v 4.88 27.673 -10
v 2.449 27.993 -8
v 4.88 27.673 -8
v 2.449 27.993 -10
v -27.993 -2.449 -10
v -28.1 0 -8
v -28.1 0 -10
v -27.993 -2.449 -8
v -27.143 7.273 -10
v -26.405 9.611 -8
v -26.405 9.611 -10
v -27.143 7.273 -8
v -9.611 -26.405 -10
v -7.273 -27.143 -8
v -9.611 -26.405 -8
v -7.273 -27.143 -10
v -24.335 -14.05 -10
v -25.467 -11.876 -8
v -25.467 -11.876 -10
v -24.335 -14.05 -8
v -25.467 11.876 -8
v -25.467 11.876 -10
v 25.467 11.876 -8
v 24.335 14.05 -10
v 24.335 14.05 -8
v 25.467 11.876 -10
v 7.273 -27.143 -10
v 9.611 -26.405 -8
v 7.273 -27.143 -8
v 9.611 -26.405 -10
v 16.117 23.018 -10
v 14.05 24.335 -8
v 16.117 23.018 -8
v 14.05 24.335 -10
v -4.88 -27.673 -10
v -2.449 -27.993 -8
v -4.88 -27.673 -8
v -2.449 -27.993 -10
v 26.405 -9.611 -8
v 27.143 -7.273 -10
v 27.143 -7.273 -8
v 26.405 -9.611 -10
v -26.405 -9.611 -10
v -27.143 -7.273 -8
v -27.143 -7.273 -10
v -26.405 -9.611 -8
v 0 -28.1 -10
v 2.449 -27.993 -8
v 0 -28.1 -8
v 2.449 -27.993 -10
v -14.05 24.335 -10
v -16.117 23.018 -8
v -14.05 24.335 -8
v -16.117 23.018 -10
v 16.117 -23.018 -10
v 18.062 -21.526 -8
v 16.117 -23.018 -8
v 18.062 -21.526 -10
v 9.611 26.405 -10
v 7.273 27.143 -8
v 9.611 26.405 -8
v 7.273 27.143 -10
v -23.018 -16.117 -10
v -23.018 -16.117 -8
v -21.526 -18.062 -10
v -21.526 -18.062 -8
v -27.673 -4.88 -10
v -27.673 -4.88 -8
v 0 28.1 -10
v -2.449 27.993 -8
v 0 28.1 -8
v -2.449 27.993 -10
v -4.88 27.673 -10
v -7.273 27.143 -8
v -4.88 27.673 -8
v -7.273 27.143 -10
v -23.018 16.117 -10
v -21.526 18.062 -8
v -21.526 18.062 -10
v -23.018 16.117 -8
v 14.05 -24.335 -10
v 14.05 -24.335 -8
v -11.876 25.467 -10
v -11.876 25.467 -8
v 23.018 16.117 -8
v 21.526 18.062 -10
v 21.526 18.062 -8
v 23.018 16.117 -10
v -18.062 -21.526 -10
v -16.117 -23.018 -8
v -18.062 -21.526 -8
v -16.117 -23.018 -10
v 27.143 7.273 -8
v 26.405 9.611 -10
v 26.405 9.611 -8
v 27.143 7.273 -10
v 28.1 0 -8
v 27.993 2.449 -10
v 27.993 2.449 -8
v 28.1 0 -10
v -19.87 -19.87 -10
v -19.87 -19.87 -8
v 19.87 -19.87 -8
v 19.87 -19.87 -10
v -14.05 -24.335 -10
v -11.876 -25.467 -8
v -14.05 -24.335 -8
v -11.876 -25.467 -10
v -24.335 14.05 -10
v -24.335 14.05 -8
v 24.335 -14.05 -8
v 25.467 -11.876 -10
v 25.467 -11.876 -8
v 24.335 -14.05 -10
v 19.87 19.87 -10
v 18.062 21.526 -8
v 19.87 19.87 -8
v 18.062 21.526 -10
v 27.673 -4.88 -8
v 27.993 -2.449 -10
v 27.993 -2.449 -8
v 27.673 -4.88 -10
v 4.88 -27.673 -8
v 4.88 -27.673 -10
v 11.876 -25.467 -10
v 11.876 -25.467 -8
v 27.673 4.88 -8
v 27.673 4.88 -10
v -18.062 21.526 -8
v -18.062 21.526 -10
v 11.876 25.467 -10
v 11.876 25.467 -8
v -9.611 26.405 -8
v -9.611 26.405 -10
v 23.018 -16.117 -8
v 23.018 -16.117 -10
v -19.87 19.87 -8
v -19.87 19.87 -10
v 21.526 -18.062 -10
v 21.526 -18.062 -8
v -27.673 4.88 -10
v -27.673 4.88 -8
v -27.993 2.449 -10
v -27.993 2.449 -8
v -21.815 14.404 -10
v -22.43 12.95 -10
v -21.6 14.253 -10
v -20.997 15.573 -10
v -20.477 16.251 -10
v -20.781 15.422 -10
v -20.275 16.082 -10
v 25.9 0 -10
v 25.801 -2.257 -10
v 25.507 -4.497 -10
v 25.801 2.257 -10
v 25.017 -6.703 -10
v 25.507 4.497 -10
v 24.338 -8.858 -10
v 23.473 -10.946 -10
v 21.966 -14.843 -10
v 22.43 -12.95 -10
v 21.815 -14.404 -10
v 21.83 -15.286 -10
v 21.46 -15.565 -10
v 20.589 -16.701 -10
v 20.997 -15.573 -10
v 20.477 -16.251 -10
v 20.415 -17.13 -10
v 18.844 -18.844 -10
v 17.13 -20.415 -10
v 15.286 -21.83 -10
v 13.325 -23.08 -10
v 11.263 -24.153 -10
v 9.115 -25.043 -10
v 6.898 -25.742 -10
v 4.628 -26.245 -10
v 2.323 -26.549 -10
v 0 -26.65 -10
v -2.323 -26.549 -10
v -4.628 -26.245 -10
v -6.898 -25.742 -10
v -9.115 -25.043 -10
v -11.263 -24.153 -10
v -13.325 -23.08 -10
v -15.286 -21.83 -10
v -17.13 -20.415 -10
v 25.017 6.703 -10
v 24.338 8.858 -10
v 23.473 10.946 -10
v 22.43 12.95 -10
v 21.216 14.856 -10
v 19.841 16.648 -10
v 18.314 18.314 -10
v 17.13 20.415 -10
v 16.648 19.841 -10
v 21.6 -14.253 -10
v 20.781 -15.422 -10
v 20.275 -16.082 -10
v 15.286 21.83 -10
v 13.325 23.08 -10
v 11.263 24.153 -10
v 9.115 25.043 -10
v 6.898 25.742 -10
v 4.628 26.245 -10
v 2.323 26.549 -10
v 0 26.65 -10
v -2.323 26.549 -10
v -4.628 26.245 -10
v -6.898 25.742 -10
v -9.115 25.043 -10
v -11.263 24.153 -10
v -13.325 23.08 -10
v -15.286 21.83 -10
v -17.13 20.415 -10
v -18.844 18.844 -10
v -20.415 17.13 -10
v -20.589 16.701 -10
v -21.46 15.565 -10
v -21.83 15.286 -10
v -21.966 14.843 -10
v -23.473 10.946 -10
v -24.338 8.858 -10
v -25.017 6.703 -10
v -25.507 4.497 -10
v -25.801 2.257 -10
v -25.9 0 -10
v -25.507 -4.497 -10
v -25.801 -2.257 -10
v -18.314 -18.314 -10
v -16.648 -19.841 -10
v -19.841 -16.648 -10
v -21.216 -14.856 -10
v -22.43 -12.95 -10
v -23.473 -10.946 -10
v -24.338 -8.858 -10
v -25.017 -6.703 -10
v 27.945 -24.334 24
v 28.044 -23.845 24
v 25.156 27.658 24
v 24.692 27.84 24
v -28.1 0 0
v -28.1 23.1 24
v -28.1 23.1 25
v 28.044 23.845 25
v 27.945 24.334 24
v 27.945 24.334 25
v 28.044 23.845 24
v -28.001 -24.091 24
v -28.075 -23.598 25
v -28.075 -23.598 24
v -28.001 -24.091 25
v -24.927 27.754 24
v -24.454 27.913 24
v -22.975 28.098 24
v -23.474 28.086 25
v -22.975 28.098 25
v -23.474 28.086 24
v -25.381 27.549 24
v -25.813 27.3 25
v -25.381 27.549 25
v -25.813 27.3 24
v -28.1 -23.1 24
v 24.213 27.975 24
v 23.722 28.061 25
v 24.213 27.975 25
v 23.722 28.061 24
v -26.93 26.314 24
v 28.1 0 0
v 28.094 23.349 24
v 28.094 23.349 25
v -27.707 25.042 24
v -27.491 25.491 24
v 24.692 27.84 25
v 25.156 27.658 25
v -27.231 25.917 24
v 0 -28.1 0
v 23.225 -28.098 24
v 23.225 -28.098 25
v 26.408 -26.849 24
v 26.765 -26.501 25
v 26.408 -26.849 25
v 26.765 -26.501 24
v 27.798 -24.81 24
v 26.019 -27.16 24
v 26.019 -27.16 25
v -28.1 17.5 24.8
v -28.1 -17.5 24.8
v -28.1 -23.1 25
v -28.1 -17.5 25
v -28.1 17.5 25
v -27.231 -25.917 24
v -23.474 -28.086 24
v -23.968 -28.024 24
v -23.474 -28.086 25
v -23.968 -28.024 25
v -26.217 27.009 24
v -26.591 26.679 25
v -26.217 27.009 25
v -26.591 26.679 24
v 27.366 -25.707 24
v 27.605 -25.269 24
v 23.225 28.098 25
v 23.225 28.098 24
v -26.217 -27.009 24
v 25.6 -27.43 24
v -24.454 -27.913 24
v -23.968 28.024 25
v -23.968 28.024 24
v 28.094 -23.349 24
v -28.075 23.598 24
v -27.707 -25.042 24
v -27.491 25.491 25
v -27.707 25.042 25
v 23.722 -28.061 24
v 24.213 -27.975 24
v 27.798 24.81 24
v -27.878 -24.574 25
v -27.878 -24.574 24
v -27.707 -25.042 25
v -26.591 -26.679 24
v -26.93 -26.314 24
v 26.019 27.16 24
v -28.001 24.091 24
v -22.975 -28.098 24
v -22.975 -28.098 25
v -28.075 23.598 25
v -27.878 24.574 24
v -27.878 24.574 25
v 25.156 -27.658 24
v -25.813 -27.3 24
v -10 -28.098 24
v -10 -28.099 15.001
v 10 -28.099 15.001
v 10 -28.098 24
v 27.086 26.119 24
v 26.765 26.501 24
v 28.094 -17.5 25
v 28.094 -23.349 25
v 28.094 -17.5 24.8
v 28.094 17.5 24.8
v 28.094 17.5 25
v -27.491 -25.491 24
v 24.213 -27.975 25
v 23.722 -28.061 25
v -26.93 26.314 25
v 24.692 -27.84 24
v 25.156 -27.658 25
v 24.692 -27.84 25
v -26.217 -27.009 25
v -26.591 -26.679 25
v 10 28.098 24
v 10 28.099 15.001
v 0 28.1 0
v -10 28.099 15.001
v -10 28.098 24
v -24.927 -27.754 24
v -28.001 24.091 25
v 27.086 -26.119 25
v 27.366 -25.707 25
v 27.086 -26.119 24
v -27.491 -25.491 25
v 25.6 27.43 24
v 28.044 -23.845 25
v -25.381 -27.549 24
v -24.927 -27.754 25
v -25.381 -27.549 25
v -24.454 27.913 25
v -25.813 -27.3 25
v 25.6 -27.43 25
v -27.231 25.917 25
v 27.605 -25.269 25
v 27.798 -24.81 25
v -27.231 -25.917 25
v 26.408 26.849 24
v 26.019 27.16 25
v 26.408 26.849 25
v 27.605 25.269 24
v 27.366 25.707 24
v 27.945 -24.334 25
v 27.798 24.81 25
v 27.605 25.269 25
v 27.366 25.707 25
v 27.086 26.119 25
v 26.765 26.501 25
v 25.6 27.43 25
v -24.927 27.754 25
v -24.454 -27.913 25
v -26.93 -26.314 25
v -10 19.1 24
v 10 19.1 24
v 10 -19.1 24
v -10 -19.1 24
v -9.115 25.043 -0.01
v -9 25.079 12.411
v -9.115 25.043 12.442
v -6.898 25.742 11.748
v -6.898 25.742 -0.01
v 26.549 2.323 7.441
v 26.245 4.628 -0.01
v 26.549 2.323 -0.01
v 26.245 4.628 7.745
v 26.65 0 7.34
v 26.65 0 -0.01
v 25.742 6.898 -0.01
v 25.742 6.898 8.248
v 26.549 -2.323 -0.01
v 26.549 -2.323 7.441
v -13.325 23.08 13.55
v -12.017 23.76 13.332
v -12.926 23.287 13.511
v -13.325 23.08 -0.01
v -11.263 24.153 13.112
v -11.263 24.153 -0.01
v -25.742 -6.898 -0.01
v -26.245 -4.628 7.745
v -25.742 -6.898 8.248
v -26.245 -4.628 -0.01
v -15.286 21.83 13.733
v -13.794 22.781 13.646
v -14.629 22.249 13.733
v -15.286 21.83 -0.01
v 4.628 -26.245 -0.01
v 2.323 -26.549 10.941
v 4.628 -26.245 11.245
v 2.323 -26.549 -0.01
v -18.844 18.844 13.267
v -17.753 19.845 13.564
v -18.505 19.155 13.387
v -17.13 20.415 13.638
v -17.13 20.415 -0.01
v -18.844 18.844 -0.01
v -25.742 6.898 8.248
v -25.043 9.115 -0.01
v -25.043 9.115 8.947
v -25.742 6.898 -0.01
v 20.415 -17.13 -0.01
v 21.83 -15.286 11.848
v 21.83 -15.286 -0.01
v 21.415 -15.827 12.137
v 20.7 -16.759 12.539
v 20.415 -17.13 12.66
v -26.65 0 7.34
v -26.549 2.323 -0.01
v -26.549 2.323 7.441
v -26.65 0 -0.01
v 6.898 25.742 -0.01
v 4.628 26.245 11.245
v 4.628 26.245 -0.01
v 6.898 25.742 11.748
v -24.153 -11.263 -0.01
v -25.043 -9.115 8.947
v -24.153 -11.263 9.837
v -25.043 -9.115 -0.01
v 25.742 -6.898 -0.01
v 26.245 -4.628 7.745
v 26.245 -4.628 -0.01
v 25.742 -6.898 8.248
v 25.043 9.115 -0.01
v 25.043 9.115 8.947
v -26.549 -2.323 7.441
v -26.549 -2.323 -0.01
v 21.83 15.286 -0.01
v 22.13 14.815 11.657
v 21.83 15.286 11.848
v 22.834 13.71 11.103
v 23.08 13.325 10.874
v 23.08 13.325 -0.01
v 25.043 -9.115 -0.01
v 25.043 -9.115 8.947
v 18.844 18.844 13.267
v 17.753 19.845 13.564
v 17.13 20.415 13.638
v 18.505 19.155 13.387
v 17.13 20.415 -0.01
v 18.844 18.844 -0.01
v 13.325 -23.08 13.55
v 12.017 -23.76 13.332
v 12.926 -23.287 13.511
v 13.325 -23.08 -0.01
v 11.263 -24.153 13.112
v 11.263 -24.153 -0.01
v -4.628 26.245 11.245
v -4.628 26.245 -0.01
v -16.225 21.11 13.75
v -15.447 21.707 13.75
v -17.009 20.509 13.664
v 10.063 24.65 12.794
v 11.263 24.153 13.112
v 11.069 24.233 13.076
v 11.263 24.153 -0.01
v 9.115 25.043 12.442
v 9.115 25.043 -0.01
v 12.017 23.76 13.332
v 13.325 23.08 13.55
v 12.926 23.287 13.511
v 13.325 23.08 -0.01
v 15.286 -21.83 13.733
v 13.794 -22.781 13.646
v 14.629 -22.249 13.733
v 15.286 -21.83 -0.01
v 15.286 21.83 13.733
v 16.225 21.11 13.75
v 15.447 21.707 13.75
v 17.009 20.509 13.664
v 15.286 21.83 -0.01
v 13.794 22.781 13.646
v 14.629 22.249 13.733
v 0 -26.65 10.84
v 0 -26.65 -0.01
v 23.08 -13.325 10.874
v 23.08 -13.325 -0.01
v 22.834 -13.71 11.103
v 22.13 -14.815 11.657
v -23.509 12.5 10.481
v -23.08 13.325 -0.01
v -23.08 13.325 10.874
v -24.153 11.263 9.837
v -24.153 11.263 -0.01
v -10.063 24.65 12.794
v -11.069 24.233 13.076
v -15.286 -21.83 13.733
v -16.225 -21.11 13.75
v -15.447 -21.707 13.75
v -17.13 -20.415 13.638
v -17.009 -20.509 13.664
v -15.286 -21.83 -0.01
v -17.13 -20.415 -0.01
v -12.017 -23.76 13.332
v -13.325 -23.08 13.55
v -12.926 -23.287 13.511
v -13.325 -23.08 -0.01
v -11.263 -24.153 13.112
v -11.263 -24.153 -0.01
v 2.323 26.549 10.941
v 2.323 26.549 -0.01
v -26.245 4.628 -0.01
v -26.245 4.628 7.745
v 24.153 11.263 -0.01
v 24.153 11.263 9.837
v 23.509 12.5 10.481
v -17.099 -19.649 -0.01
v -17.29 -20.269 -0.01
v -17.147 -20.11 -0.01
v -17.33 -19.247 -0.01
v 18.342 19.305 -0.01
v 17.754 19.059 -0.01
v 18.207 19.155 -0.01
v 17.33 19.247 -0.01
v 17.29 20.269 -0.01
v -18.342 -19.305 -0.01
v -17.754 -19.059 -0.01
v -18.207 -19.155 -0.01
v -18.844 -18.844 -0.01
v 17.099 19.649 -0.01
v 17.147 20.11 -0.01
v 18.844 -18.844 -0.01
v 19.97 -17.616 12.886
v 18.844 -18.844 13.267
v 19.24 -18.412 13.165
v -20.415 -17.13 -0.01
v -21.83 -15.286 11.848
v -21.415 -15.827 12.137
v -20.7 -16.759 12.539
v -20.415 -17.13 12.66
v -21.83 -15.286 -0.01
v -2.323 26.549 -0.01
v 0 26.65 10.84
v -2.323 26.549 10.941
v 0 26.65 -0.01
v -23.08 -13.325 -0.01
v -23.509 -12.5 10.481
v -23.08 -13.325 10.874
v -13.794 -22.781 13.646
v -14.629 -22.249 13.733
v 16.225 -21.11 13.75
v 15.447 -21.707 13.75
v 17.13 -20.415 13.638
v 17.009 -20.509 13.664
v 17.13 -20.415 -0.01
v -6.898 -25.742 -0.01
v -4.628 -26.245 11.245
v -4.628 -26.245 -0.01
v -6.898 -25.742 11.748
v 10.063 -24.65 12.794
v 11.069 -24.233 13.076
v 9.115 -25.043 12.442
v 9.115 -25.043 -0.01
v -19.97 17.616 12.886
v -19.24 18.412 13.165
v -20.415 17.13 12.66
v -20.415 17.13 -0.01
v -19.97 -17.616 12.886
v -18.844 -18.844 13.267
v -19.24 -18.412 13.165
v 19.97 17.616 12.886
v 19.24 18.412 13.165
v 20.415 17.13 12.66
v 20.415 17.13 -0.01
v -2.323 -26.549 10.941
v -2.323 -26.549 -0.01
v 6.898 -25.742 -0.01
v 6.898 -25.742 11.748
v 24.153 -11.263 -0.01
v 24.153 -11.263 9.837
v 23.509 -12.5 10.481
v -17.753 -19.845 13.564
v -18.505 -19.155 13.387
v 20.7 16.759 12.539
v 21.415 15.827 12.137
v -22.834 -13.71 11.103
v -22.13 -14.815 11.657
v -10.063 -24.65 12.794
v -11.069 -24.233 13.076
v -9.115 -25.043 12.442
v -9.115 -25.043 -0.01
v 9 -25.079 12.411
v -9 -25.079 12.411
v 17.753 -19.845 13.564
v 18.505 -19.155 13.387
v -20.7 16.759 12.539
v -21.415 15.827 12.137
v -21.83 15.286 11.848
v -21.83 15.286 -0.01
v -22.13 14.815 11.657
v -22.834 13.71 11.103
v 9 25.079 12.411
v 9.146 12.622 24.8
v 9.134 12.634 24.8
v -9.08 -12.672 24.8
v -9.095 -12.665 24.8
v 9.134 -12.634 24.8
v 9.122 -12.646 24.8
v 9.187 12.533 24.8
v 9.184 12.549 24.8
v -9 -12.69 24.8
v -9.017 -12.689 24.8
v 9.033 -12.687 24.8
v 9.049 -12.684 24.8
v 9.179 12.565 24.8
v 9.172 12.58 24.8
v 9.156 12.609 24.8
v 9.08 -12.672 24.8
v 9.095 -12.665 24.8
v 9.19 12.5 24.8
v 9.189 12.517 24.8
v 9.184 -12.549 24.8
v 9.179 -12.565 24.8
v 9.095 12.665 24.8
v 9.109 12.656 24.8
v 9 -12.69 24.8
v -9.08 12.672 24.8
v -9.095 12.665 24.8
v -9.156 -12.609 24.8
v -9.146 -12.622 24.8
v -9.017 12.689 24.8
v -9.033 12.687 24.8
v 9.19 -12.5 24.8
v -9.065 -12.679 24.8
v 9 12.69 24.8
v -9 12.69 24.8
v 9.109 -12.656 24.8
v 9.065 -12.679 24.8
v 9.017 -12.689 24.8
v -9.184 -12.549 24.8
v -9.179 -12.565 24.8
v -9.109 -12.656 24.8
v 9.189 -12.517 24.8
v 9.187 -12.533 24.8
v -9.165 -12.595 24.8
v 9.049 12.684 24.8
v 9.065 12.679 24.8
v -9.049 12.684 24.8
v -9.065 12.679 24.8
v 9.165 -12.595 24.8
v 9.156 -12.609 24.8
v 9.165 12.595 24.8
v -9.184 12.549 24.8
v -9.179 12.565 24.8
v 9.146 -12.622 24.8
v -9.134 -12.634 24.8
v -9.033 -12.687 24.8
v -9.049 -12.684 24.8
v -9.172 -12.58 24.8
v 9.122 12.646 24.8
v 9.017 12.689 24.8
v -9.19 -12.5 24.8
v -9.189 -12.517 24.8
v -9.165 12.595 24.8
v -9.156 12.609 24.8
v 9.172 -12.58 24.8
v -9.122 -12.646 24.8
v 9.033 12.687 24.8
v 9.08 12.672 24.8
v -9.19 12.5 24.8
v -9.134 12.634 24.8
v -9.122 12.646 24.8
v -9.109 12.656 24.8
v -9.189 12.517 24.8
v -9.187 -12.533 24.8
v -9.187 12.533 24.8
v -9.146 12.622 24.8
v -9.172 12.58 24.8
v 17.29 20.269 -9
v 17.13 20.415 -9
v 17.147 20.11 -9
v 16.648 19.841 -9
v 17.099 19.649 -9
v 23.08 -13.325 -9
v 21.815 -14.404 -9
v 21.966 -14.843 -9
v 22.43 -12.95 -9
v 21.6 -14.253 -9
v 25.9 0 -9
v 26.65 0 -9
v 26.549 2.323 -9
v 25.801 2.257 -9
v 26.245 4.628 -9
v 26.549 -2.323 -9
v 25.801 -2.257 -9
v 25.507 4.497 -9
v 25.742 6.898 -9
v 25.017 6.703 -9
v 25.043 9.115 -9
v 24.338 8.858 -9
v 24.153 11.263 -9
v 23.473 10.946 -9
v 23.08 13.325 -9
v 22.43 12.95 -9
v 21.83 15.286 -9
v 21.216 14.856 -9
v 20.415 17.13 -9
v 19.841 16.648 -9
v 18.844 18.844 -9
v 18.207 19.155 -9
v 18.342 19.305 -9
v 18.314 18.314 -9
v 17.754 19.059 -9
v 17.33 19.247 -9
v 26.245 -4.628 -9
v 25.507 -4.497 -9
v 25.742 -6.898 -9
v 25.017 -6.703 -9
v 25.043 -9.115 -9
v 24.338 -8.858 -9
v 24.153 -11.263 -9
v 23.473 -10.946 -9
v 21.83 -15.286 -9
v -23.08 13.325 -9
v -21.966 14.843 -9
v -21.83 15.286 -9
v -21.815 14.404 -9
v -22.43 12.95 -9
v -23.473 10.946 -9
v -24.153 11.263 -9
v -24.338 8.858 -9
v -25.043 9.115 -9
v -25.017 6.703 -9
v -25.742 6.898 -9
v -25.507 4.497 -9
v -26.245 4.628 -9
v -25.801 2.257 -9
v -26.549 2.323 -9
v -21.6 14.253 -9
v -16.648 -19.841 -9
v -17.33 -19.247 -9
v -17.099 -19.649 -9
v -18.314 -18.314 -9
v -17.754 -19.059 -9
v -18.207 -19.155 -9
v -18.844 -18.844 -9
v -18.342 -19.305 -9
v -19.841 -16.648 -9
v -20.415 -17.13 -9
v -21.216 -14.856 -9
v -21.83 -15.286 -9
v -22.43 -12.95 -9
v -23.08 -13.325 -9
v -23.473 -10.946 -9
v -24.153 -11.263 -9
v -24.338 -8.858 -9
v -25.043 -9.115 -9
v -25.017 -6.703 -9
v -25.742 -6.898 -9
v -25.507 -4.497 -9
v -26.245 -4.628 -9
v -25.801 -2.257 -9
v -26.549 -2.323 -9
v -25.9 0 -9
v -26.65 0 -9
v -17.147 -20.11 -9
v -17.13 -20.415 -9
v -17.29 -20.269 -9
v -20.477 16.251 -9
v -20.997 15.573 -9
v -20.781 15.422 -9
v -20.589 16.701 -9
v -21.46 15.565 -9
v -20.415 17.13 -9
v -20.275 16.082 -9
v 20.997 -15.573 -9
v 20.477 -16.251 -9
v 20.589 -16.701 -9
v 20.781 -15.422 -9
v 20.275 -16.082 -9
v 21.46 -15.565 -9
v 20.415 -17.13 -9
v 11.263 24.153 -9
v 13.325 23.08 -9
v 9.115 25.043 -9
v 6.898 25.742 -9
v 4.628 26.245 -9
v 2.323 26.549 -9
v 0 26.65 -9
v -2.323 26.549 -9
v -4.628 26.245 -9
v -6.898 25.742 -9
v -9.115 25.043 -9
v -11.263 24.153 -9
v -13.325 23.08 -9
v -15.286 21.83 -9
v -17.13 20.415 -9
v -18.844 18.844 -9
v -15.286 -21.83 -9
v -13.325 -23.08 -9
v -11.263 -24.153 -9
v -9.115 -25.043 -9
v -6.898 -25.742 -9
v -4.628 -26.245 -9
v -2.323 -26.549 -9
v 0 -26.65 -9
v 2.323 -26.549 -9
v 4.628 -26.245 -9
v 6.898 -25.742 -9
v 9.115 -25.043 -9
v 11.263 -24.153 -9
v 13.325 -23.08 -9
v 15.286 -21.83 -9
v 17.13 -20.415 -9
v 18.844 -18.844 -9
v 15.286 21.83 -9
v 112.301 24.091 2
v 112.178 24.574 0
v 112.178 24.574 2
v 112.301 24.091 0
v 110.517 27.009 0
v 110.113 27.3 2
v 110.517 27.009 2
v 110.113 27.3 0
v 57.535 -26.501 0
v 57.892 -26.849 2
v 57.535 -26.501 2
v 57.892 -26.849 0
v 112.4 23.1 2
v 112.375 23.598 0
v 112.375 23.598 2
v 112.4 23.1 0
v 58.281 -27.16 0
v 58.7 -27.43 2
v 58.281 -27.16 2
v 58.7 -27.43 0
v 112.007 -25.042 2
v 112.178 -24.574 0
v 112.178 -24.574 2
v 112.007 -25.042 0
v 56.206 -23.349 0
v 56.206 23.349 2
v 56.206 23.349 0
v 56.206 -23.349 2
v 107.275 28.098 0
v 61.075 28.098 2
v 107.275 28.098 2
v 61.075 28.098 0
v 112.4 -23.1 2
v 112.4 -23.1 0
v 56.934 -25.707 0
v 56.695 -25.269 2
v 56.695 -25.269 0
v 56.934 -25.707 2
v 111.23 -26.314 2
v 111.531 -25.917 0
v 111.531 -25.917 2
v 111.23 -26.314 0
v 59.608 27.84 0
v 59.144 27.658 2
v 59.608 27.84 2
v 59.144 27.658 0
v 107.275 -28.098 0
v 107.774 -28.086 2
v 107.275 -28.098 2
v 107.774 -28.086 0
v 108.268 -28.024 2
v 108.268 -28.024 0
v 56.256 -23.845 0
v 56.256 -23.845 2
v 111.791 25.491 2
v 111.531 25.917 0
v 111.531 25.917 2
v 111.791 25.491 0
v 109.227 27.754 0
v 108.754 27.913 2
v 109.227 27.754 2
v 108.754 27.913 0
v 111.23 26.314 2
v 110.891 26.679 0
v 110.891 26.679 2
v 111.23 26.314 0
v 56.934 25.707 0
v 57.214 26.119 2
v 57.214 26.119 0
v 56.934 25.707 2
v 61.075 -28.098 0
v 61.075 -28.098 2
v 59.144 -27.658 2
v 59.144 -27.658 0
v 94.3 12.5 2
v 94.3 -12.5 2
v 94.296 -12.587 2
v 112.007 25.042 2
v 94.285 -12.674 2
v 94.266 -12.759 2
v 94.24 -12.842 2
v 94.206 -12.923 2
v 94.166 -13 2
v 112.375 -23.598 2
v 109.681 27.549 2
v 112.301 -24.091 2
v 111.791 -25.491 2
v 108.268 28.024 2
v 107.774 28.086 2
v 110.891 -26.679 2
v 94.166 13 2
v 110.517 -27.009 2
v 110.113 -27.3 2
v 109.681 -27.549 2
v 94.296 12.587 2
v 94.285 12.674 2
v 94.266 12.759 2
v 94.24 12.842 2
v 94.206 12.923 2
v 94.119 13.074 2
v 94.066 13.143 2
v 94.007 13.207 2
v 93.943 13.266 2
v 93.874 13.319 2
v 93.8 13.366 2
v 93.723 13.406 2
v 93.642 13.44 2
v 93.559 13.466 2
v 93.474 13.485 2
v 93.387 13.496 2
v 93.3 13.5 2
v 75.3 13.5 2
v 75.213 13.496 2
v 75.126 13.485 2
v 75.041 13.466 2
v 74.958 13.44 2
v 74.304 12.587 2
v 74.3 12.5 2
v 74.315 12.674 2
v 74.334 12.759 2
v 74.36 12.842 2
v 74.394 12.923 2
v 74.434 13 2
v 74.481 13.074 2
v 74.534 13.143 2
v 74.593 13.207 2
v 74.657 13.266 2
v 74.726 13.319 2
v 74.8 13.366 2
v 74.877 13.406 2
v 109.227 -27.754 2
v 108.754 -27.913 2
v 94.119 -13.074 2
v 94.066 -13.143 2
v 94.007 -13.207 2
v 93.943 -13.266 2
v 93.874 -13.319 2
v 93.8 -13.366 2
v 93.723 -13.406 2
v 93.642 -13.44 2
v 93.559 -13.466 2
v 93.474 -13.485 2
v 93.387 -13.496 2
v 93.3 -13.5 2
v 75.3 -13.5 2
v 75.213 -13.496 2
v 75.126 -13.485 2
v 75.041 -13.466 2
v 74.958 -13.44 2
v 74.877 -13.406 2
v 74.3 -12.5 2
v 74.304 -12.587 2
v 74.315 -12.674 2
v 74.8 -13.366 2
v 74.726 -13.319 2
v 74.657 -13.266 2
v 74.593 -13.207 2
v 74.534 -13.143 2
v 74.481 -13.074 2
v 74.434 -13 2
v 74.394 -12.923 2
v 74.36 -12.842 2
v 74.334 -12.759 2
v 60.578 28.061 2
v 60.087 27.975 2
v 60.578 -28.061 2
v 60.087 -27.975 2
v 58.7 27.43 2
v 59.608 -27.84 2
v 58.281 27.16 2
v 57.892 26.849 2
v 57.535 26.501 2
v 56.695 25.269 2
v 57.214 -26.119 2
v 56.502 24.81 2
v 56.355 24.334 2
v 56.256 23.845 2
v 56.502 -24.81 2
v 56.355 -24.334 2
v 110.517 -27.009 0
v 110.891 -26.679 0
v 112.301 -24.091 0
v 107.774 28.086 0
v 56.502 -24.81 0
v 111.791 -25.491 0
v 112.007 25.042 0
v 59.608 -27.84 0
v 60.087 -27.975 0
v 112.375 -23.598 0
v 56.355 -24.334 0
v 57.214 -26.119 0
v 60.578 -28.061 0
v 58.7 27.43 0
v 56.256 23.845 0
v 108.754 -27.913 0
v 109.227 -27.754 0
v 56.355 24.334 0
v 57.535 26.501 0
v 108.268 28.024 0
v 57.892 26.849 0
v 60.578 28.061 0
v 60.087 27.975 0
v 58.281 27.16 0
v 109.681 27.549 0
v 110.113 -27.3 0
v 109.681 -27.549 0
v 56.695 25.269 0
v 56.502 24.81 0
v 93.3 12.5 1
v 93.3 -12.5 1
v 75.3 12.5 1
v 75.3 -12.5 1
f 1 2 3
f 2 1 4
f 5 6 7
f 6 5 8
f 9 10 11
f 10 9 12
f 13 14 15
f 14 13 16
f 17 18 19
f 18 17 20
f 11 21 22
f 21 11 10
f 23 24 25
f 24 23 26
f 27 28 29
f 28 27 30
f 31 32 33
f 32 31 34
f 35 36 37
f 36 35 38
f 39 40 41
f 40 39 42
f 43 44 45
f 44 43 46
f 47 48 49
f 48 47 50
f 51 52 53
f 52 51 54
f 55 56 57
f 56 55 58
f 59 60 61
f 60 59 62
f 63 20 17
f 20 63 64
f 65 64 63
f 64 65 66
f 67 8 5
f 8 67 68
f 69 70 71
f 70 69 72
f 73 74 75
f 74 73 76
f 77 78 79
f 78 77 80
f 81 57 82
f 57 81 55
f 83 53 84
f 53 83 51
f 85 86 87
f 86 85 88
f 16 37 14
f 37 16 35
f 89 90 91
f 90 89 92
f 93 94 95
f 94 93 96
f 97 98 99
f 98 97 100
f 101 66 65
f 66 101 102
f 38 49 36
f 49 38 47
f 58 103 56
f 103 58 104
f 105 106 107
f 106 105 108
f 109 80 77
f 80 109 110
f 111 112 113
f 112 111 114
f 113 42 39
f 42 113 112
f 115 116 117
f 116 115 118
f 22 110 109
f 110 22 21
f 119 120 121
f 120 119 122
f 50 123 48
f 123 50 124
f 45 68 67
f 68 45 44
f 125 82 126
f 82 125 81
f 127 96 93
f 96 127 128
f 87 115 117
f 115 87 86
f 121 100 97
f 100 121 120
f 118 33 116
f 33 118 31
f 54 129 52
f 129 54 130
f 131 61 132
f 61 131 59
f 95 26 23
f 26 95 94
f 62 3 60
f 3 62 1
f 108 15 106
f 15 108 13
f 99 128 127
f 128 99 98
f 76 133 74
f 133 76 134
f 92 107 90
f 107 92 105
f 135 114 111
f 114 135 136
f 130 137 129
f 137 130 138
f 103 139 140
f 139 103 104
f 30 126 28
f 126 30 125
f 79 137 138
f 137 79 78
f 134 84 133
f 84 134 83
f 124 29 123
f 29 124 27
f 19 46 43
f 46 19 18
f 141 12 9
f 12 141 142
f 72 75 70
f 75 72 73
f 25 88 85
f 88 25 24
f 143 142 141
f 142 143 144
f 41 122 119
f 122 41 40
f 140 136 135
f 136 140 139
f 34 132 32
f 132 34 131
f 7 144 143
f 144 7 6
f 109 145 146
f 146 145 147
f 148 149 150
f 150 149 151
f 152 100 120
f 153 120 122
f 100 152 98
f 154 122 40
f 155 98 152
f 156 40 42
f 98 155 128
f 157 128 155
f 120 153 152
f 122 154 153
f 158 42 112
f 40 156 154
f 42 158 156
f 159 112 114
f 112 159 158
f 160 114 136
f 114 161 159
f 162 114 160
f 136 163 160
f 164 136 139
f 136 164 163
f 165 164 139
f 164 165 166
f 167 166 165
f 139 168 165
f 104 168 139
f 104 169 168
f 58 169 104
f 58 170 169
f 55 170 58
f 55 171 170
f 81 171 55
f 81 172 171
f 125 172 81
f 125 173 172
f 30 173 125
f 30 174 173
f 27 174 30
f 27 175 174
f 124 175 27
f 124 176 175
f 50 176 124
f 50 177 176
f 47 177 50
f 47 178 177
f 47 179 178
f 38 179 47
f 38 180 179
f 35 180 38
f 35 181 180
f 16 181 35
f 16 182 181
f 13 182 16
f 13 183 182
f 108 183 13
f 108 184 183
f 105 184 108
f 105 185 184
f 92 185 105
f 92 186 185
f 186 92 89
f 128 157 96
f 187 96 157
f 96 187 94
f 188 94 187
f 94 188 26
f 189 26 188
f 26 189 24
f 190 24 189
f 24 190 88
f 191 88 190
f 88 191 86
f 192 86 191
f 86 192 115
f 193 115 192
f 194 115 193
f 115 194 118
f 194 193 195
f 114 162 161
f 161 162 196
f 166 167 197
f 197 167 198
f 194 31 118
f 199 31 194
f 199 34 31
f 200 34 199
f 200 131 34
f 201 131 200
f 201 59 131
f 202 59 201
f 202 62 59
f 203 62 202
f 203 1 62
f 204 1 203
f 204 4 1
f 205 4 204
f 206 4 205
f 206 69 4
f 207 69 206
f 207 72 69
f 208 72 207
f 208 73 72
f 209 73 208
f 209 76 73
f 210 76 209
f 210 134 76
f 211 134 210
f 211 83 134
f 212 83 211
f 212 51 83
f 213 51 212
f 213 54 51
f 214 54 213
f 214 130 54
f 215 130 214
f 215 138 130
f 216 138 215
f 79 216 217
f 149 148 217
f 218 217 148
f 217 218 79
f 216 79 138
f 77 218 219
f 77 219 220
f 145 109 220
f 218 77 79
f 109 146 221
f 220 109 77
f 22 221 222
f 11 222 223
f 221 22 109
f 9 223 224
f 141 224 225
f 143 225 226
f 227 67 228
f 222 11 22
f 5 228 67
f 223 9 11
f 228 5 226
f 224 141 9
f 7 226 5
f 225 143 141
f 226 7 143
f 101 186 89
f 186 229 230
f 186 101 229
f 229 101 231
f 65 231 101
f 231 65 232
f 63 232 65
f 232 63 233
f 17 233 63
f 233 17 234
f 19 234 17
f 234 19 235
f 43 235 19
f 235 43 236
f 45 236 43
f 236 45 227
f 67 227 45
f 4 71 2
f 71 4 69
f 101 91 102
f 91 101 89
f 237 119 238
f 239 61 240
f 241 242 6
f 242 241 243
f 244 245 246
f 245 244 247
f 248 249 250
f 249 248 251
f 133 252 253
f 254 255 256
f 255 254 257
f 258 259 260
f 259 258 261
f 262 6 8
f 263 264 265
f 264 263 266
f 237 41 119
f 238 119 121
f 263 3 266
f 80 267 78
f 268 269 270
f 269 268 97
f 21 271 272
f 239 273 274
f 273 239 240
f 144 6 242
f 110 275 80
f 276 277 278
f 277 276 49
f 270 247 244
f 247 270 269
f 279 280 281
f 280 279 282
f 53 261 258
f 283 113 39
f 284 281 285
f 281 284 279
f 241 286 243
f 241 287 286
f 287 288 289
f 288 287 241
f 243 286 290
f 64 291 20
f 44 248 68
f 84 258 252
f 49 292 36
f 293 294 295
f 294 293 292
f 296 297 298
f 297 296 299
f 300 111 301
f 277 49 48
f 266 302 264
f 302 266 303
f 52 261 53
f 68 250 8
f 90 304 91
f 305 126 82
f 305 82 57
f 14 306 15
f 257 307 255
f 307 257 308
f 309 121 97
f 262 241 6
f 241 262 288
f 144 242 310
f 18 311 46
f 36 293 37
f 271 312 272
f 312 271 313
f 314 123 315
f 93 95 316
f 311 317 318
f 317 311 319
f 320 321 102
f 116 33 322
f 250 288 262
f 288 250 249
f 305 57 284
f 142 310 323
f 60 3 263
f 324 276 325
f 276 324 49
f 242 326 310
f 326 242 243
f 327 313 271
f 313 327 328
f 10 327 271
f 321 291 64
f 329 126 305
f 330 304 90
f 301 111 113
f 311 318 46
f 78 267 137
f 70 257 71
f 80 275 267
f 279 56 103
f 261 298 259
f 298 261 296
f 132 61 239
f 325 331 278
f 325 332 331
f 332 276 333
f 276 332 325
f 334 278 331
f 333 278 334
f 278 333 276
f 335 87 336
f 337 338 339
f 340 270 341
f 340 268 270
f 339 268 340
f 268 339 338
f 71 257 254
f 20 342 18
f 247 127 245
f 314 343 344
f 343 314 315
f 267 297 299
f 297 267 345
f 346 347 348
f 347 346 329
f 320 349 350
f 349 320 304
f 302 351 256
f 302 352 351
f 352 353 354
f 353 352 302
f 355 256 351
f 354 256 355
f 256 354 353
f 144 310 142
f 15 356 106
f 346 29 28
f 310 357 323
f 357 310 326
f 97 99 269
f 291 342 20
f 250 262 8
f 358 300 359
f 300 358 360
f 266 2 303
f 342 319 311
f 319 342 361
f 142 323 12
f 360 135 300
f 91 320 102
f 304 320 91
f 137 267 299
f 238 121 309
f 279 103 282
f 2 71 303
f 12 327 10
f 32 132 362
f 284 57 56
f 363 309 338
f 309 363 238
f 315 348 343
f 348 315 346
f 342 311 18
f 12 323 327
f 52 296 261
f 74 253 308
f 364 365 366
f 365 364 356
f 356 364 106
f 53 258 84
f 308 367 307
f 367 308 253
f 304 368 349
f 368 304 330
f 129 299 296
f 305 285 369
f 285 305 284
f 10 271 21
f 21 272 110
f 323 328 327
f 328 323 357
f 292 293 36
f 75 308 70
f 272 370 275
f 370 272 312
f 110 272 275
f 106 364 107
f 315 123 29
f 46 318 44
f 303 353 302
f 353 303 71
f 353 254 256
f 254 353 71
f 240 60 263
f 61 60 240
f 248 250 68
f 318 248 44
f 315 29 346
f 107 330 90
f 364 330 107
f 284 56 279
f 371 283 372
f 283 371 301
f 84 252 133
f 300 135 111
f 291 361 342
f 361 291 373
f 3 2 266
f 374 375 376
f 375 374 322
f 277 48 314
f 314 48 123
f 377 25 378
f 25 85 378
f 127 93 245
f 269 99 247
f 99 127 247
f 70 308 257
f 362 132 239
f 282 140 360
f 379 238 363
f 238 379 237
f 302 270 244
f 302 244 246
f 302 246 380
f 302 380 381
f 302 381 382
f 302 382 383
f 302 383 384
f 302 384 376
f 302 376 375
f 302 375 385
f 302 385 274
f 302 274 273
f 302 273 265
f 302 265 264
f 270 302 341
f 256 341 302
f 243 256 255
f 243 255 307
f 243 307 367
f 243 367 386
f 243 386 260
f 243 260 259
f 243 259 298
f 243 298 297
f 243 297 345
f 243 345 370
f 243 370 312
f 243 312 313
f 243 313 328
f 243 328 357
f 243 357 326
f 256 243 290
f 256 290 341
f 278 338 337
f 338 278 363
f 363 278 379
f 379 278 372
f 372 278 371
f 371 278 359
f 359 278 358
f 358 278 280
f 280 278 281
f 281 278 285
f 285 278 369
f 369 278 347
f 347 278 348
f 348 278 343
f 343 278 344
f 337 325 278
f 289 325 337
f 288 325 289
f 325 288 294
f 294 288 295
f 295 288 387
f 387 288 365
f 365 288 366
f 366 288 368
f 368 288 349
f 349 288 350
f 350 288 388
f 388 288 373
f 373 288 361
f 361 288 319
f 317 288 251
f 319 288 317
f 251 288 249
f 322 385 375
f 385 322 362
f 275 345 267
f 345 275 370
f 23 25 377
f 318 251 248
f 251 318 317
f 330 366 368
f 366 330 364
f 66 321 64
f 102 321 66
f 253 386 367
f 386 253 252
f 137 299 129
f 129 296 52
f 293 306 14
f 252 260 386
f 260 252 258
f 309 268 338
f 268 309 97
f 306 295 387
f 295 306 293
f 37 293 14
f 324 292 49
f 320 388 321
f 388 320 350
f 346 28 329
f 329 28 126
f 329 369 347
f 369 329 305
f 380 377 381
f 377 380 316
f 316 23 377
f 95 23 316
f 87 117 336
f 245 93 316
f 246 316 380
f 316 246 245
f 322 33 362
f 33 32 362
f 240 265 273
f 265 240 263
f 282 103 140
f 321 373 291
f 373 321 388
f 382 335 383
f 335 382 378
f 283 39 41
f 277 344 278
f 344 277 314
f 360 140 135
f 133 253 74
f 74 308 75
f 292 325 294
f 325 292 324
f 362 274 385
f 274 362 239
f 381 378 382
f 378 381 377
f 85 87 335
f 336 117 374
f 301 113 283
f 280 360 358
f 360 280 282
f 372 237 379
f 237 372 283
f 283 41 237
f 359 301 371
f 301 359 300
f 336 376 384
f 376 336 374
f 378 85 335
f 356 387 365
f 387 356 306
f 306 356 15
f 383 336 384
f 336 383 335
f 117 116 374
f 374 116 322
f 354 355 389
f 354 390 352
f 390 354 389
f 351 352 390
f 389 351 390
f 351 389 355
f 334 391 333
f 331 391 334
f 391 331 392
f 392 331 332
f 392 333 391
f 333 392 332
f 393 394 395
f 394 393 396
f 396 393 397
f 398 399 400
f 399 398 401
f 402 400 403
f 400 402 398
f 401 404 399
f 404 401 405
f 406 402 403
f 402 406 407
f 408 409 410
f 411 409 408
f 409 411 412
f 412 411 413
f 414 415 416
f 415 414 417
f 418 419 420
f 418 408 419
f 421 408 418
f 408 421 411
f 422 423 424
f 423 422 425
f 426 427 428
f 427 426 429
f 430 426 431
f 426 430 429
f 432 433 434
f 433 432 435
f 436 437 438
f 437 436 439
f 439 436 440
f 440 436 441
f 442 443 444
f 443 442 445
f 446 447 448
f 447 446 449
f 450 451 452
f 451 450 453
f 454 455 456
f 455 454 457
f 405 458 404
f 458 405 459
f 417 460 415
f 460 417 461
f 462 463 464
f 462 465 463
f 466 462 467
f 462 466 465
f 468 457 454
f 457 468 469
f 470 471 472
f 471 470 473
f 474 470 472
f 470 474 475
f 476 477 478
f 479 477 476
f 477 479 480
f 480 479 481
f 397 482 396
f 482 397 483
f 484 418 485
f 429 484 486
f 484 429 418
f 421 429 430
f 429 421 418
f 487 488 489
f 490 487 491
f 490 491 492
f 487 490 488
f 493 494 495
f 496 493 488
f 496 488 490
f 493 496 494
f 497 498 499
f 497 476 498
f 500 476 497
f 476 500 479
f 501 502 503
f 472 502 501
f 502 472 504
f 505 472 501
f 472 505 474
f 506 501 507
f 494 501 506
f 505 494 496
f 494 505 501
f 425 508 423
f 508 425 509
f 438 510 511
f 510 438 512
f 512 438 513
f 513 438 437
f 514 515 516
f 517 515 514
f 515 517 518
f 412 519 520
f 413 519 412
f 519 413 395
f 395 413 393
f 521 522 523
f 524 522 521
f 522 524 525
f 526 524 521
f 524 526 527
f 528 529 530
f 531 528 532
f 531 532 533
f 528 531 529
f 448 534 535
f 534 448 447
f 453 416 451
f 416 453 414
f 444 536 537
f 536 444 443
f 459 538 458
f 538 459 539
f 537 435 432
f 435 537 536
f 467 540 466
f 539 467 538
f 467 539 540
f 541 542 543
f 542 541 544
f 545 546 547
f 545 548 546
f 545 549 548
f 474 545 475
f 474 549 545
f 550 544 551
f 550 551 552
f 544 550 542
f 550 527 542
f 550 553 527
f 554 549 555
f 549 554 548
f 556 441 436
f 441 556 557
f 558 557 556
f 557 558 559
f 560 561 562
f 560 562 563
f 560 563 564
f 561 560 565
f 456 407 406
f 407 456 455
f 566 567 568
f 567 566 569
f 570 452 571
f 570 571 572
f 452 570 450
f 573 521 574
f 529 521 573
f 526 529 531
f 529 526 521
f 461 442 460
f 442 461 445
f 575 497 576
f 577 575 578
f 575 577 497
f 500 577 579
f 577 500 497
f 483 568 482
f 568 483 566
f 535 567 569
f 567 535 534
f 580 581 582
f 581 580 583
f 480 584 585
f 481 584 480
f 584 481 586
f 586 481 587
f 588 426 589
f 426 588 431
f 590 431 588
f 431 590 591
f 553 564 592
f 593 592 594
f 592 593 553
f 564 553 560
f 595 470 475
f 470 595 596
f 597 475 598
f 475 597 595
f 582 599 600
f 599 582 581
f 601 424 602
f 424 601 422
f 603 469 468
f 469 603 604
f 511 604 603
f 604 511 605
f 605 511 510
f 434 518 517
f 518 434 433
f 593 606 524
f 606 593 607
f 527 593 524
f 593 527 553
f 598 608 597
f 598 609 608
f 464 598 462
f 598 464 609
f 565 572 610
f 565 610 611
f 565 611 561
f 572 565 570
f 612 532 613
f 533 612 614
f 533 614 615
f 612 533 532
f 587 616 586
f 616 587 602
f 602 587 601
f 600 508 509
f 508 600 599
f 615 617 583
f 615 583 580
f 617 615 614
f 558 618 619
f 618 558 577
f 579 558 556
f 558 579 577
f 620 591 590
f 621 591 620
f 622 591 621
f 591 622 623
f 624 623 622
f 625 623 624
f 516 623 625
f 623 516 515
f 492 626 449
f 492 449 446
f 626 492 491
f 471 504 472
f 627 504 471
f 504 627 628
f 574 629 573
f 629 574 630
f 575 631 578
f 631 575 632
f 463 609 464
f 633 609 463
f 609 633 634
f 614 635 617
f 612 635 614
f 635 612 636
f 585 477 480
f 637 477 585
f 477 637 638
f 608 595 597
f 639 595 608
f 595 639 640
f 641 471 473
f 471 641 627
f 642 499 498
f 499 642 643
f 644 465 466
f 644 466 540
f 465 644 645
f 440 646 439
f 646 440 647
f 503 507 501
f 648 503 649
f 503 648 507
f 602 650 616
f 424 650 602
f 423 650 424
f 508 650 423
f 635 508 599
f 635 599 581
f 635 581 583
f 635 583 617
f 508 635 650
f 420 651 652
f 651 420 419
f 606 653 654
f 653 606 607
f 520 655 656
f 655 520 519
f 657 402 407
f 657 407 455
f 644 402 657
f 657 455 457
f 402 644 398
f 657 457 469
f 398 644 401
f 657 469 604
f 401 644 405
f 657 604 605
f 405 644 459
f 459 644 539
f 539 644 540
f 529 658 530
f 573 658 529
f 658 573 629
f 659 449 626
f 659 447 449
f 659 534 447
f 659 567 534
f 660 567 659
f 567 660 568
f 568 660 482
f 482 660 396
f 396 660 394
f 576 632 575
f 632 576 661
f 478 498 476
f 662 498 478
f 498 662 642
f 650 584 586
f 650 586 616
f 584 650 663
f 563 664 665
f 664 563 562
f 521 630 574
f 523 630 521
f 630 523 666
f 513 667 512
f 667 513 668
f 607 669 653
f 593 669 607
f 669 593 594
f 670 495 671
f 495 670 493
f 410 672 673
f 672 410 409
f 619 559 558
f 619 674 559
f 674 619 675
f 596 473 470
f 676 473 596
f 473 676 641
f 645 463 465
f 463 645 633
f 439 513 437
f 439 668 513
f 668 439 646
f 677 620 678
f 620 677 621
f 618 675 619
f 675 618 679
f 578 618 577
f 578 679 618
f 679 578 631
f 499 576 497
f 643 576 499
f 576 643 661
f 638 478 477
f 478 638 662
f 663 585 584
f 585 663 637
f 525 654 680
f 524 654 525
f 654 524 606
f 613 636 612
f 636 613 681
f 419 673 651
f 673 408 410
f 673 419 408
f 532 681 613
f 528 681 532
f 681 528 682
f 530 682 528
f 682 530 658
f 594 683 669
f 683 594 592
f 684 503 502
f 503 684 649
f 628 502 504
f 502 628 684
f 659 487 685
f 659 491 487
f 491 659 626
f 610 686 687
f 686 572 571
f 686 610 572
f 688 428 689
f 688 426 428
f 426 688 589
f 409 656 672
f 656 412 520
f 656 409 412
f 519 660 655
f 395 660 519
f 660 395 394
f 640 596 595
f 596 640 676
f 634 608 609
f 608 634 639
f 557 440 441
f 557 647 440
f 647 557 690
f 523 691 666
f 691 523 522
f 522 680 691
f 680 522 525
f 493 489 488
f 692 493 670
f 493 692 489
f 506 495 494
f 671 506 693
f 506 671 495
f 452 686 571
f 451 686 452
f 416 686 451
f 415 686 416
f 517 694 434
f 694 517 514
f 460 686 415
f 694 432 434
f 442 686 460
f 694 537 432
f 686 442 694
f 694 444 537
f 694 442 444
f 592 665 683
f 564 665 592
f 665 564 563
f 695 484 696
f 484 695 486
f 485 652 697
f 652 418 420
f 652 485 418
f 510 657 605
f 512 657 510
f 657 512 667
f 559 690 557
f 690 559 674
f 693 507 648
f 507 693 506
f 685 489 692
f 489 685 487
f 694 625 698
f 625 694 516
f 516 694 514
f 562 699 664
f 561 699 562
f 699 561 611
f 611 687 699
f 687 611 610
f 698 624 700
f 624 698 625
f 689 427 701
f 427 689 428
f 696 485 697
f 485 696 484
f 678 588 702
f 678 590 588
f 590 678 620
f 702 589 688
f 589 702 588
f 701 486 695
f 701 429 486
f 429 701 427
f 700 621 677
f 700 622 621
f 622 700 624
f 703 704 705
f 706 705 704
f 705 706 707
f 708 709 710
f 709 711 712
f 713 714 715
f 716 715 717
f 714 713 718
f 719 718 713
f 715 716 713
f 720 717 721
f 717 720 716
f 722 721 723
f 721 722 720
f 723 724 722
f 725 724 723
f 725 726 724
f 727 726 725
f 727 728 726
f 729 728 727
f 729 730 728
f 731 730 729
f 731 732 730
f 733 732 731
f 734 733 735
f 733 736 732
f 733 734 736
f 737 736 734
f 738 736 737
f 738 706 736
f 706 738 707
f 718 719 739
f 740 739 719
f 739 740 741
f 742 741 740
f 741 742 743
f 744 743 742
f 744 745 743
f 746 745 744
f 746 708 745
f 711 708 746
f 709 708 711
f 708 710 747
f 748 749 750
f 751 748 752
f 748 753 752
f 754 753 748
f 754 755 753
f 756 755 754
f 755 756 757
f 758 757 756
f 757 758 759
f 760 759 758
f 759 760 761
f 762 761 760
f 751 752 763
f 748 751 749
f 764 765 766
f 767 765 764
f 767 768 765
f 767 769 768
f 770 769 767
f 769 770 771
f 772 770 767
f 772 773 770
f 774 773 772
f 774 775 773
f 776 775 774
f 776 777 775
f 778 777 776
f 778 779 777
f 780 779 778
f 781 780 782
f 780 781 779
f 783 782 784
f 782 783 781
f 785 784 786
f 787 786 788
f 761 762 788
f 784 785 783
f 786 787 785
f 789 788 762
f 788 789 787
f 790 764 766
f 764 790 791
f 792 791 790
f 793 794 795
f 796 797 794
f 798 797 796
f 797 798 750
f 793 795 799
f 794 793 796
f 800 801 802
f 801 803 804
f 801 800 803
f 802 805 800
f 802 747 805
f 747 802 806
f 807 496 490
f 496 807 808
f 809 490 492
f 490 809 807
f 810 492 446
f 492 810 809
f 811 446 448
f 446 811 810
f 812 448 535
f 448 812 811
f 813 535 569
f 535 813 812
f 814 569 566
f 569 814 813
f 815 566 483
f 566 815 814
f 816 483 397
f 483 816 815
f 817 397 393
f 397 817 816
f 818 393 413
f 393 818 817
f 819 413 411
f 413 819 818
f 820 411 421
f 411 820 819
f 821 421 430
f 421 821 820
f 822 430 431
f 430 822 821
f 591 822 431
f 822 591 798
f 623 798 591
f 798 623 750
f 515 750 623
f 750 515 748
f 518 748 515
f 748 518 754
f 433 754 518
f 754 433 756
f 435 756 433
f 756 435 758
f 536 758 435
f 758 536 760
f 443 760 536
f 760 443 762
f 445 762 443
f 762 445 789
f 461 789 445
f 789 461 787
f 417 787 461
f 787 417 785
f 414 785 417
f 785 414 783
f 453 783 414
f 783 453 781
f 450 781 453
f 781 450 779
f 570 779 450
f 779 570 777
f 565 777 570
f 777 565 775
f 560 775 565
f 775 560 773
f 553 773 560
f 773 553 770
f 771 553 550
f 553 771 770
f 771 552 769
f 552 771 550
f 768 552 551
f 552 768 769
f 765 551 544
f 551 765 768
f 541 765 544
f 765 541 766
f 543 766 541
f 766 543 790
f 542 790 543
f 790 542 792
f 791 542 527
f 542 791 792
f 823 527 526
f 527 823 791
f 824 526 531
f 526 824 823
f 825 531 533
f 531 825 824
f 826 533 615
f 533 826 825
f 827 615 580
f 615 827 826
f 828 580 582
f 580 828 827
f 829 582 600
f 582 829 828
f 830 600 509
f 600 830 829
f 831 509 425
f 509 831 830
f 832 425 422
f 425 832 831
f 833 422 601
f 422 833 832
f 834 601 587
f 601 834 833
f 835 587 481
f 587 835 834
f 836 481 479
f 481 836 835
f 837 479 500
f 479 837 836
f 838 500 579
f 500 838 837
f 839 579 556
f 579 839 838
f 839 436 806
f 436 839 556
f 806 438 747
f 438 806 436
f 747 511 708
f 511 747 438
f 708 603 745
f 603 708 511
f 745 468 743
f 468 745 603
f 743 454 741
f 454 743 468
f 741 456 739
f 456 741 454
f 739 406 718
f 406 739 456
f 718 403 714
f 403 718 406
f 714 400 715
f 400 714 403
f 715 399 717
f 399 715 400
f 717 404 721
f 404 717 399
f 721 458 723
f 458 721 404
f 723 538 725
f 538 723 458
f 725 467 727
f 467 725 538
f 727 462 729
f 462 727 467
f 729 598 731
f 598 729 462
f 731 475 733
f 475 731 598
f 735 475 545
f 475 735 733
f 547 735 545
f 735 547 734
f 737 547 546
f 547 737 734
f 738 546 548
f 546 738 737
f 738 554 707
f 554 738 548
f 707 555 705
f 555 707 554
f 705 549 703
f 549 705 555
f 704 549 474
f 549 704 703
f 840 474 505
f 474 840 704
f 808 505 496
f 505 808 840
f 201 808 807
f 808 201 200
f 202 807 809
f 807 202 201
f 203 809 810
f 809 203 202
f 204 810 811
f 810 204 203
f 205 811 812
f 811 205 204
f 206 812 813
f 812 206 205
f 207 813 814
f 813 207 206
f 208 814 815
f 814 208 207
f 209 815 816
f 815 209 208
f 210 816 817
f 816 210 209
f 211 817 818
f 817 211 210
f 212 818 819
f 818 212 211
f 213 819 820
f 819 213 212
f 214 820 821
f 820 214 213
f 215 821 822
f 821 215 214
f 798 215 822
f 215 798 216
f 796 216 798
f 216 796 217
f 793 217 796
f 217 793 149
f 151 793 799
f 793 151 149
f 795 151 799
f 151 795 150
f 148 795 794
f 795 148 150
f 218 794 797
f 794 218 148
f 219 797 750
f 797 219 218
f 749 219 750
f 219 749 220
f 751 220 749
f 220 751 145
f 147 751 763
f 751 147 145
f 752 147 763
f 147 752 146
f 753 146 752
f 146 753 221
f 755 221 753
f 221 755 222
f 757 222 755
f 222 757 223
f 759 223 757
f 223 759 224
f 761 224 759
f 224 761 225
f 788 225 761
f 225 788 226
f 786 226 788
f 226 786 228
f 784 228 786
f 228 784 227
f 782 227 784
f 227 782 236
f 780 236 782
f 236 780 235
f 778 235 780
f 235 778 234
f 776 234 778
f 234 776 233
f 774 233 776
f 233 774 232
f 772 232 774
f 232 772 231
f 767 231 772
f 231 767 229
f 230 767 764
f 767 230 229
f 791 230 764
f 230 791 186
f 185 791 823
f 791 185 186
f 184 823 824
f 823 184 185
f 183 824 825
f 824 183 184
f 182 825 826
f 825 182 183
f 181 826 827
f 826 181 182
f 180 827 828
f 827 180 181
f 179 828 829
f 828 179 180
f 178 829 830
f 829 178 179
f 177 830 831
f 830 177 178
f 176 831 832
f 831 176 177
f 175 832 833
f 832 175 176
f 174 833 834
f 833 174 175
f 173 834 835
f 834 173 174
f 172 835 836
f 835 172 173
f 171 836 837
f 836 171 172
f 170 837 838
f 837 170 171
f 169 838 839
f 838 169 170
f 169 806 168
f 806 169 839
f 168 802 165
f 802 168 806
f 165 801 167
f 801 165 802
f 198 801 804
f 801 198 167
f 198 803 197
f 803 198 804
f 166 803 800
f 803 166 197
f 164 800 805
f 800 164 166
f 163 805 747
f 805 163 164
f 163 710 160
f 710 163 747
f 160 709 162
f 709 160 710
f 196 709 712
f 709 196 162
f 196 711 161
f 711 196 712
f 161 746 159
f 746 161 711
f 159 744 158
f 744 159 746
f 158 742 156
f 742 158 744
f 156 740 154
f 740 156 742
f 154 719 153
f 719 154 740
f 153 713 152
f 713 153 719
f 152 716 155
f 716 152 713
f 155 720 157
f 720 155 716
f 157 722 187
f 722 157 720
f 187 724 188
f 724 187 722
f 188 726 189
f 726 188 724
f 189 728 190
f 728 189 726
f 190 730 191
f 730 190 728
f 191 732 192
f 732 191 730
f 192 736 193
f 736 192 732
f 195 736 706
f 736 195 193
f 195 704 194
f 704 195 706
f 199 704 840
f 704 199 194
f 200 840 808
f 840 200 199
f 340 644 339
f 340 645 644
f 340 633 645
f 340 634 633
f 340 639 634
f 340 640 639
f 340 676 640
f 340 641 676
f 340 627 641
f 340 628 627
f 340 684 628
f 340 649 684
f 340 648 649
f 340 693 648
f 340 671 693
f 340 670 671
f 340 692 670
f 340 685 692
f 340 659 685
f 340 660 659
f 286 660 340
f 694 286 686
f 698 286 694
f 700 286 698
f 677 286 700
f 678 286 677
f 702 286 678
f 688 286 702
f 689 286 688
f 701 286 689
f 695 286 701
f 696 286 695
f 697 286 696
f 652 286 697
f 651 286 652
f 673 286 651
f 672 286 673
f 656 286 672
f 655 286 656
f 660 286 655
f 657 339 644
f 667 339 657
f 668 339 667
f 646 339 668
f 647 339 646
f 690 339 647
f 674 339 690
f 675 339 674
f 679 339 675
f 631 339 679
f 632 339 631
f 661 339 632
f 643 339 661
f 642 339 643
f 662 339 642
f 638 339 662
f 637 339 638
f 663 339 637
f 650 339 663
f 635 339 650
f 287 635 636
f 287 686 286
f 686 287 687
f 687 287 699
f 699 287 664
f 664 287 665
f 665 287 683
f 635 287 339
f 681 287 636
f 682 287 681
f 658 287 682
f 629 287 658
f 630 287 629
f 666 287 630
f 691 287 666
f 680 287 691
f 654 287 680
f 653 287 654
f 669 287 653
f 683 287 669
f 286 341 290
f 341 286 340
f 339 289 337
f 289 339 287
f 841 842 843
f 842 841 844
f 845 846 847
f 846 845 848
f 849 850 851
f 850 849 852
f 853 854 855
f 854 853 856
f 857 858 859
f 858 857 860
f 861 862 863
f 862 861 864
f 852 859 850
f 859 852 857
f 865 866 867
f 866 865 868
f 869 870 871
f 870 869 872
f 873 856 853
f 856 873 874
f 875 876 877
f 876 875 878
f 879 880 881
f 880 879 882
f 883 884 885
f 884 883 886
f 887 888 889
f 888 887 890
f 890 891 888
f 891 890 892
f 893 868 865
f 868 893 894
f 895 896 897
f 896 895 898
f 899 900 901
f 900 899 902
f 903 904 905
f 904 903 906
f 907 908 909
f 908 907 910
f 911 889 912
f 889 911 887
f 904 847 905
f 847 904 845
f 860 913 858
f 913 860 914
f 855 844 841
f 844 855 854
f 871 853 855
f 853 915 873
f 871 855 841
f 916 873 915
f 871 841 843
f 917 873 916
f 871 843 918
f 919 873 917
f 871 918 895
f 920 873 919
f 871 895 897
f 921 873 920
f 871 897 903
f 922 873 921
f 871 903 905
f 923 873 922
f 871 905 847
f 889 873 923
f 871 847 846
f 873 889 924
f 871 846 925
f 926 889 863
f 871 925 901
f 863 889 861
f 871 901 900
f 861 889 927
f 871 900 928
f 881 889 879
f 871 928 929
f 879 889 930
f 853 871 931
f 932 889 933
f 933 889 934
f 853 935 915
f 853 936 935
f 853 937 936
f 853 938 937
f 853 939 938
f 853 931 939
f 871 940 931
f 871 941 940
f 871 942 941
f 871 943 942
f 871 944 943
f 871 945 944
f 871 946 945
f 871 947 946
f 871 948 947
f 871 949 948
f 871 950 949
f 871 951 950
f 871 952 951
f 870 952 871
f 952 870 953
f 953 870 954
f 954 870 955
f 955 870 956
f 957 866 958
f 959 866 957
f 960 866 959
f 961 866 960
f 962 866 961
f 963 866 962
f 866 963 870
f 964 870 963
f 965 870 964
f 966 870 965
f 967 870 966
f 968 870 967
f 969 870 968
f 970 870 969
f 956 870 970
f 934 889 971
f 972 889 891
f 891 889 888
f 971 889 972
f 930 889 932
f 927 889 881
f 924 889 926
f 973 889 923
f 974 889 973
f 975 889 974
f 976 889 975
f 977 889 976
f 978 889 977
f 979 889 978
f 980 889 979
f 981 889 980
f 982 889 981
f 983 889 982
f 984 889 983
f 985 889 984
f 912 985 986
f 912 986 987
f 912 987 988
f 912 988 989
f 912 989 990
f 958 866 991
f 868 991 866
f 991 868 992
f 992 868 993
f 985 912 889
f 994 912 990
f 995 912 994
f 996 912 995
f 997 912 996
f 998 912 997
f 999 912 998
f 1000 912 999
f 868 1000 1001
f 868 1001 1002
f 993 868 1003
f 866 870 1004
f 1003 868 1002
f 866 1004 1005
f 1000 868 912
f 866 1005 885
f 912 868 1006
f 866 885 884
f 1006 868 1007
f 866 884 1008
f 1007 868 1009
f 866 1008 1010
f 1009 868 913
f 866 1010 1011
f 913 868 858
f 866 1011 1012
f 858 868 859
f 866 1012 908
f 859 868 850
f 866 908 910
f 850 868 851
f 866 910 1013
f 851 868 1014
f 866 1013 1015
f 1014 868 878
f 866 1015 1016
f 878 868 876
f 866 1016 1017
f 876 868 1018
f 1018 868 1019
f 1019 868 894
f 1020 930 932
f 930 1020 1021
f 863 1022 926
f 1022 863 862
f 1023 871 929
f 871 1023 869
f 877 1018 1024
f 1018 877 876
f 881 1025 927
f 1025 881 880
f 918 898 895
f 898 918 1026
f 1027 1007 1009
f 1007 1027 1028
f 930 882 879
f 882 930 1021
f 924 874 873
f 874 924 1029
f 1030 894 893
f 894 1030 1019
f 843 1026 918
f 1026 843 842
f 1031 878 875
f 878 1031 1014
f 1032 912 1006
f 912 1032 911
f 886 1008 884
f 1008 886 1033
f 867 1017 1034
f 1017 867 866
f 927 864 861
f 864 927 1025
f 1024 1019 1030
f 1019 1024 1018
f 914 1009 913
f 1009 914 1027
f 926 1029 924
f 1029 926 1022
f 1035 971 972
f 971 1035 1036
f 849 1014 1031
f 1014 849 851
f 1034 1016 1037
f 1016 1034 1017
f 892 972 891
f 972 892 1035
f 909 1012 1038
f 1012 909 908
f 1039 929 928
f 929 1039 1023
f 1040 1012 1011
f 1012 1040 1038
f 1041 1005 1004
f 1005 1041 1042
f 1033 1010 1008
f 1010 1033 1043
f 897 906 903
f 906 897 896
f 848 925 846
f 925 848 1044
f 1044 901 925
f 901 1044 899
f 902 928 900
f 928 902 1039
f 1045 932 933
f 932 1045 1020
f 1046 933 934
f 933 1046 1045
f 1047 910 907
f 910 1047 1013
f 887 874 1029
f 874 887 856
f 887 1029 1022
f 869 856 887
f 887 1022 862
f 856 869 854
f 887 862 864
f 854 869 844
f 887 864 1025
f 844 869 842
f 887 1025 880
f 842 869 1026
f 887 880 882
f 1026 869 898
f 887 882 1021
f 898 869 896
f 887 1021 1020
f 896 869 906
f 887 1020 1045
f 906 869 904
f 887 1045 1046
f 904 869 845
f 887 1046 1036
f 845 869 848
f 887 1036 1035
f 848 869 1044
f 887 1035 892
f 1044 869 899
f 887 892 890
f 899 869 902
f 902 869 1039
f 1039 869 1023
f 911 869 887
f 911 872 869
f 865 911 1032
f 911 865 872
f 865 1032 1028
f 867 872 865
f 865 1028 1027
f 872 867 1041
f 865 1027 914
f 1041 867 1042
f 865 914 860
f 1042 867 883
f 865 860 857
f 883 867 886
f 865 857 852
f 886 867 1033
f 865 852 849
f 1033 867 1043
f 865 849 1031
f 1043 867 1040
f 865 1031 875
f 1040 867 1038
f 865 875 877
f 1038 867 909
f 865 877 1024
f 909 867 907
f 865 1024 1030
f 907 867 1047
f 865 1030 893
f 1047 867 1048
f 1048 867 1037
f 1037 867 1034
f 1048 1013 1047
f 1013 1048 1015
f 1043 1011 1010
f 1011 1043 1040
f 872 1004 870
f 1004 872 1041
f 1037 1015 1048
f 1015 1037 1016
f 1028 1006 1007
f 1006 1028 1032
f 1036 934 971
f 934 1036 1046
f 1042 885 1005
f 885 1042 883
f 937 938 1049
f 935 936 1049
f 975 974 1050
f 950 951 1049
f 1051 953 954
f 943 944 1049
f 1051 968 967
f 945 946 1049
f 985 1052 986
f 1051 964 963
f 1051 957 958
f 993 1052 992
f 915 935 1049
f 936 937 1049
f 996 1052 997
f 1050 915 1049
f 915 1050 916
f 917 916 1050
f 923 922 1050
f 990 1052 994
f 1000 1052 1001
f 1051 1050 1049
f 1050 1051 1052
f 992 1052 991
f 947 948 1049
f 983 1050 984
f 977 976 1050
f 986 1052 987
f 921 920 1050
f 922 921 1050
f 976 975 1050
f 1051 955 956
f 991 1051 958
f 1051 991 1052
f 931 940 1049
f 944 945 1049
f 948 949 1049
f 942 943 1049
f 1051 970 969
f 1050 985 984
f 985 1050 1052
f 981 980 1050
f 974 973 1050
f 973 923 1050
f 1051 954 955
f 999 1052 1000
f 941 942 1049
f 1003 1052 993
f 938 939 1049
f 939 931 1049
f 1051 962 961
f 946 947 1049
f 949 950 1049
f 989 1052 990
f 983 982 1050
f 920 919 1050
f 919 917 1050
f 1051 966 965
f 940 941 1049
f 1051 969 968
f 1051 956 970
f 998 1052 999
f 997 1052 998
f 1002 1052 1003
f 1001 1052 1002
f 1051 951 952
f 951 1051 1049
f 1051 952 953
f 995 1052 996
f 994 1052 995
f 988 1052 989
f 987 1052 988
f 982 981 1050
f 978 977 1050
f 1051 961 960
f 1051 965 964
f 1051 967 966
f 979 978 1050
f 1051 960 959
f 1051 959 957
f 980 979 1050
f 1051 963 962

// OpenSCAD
$fa=5;$fs=.5;
d_outer=56.2;
d_inner=53.3;
d_latch=51.8;

target=[18,25];
film_w=35;
dist=25;


difference(){
	union(){
		scale(-1)cylinder(d=d_outer,h=10);
		hull(){
			scale(-1)cylinder(d=d_outer,h=8);
			translate([0,0,dist])scale(-1)linear_extrude(1)minkowski(){
				square(d_outer-5*2,center=true);
				circle(r=5);
			}
		}
	}
	translate([0,0,dist])cube([d_outer*2,film_w,.4],center=true);
	for(i=[1,3])rotate(90*i)translate([d_outer/2,0,dist])rotate([90,180,0])linear_extrude(20,center=true)
		translate([-1,1])polygon([[0,0],[10,0],[0,10]]);


	translate([0,0,-1e-2])
	intersection(){
		cylinder(d=d_inner,h=dist);
		minkowski(){
			linear_extrude(1)square(target,center=true);
			cylinder(dist-1,dist-1,0);
		}
	}

	rotate(-35){
	scale(-1)linear_extrude(9)difference(){
		circle(d=d_inner);
		for(t=[83,-97])rotate(t)
			translate([d_inner/2,0,0])circle(d=d_inner-d_latch);
	}
	scale(-1)linear_extrude(12){
		circle(d=d_latch);
		for(t=[-5,0,175,180])rotate(t)
			translate([d_latch/2,0,0])circle(d=d_inner-d_latch);
		rotate(-5)difference(){
			circle(d=d_inner);
			square(d_outer);
			scale(-1)square(d_outer);
		}
	}
}
}

translate([d_outer*1.5,0,0])difference(){
	linear_extrude(2)minkowski(){
		square(d_outer-5*2,center=true);
		circle(5);
	}

	translate([0,0,1])minkowski(){
		linear_extrude(2)square(target,center=true);
		cylinder(10,0,10);
	}
}
